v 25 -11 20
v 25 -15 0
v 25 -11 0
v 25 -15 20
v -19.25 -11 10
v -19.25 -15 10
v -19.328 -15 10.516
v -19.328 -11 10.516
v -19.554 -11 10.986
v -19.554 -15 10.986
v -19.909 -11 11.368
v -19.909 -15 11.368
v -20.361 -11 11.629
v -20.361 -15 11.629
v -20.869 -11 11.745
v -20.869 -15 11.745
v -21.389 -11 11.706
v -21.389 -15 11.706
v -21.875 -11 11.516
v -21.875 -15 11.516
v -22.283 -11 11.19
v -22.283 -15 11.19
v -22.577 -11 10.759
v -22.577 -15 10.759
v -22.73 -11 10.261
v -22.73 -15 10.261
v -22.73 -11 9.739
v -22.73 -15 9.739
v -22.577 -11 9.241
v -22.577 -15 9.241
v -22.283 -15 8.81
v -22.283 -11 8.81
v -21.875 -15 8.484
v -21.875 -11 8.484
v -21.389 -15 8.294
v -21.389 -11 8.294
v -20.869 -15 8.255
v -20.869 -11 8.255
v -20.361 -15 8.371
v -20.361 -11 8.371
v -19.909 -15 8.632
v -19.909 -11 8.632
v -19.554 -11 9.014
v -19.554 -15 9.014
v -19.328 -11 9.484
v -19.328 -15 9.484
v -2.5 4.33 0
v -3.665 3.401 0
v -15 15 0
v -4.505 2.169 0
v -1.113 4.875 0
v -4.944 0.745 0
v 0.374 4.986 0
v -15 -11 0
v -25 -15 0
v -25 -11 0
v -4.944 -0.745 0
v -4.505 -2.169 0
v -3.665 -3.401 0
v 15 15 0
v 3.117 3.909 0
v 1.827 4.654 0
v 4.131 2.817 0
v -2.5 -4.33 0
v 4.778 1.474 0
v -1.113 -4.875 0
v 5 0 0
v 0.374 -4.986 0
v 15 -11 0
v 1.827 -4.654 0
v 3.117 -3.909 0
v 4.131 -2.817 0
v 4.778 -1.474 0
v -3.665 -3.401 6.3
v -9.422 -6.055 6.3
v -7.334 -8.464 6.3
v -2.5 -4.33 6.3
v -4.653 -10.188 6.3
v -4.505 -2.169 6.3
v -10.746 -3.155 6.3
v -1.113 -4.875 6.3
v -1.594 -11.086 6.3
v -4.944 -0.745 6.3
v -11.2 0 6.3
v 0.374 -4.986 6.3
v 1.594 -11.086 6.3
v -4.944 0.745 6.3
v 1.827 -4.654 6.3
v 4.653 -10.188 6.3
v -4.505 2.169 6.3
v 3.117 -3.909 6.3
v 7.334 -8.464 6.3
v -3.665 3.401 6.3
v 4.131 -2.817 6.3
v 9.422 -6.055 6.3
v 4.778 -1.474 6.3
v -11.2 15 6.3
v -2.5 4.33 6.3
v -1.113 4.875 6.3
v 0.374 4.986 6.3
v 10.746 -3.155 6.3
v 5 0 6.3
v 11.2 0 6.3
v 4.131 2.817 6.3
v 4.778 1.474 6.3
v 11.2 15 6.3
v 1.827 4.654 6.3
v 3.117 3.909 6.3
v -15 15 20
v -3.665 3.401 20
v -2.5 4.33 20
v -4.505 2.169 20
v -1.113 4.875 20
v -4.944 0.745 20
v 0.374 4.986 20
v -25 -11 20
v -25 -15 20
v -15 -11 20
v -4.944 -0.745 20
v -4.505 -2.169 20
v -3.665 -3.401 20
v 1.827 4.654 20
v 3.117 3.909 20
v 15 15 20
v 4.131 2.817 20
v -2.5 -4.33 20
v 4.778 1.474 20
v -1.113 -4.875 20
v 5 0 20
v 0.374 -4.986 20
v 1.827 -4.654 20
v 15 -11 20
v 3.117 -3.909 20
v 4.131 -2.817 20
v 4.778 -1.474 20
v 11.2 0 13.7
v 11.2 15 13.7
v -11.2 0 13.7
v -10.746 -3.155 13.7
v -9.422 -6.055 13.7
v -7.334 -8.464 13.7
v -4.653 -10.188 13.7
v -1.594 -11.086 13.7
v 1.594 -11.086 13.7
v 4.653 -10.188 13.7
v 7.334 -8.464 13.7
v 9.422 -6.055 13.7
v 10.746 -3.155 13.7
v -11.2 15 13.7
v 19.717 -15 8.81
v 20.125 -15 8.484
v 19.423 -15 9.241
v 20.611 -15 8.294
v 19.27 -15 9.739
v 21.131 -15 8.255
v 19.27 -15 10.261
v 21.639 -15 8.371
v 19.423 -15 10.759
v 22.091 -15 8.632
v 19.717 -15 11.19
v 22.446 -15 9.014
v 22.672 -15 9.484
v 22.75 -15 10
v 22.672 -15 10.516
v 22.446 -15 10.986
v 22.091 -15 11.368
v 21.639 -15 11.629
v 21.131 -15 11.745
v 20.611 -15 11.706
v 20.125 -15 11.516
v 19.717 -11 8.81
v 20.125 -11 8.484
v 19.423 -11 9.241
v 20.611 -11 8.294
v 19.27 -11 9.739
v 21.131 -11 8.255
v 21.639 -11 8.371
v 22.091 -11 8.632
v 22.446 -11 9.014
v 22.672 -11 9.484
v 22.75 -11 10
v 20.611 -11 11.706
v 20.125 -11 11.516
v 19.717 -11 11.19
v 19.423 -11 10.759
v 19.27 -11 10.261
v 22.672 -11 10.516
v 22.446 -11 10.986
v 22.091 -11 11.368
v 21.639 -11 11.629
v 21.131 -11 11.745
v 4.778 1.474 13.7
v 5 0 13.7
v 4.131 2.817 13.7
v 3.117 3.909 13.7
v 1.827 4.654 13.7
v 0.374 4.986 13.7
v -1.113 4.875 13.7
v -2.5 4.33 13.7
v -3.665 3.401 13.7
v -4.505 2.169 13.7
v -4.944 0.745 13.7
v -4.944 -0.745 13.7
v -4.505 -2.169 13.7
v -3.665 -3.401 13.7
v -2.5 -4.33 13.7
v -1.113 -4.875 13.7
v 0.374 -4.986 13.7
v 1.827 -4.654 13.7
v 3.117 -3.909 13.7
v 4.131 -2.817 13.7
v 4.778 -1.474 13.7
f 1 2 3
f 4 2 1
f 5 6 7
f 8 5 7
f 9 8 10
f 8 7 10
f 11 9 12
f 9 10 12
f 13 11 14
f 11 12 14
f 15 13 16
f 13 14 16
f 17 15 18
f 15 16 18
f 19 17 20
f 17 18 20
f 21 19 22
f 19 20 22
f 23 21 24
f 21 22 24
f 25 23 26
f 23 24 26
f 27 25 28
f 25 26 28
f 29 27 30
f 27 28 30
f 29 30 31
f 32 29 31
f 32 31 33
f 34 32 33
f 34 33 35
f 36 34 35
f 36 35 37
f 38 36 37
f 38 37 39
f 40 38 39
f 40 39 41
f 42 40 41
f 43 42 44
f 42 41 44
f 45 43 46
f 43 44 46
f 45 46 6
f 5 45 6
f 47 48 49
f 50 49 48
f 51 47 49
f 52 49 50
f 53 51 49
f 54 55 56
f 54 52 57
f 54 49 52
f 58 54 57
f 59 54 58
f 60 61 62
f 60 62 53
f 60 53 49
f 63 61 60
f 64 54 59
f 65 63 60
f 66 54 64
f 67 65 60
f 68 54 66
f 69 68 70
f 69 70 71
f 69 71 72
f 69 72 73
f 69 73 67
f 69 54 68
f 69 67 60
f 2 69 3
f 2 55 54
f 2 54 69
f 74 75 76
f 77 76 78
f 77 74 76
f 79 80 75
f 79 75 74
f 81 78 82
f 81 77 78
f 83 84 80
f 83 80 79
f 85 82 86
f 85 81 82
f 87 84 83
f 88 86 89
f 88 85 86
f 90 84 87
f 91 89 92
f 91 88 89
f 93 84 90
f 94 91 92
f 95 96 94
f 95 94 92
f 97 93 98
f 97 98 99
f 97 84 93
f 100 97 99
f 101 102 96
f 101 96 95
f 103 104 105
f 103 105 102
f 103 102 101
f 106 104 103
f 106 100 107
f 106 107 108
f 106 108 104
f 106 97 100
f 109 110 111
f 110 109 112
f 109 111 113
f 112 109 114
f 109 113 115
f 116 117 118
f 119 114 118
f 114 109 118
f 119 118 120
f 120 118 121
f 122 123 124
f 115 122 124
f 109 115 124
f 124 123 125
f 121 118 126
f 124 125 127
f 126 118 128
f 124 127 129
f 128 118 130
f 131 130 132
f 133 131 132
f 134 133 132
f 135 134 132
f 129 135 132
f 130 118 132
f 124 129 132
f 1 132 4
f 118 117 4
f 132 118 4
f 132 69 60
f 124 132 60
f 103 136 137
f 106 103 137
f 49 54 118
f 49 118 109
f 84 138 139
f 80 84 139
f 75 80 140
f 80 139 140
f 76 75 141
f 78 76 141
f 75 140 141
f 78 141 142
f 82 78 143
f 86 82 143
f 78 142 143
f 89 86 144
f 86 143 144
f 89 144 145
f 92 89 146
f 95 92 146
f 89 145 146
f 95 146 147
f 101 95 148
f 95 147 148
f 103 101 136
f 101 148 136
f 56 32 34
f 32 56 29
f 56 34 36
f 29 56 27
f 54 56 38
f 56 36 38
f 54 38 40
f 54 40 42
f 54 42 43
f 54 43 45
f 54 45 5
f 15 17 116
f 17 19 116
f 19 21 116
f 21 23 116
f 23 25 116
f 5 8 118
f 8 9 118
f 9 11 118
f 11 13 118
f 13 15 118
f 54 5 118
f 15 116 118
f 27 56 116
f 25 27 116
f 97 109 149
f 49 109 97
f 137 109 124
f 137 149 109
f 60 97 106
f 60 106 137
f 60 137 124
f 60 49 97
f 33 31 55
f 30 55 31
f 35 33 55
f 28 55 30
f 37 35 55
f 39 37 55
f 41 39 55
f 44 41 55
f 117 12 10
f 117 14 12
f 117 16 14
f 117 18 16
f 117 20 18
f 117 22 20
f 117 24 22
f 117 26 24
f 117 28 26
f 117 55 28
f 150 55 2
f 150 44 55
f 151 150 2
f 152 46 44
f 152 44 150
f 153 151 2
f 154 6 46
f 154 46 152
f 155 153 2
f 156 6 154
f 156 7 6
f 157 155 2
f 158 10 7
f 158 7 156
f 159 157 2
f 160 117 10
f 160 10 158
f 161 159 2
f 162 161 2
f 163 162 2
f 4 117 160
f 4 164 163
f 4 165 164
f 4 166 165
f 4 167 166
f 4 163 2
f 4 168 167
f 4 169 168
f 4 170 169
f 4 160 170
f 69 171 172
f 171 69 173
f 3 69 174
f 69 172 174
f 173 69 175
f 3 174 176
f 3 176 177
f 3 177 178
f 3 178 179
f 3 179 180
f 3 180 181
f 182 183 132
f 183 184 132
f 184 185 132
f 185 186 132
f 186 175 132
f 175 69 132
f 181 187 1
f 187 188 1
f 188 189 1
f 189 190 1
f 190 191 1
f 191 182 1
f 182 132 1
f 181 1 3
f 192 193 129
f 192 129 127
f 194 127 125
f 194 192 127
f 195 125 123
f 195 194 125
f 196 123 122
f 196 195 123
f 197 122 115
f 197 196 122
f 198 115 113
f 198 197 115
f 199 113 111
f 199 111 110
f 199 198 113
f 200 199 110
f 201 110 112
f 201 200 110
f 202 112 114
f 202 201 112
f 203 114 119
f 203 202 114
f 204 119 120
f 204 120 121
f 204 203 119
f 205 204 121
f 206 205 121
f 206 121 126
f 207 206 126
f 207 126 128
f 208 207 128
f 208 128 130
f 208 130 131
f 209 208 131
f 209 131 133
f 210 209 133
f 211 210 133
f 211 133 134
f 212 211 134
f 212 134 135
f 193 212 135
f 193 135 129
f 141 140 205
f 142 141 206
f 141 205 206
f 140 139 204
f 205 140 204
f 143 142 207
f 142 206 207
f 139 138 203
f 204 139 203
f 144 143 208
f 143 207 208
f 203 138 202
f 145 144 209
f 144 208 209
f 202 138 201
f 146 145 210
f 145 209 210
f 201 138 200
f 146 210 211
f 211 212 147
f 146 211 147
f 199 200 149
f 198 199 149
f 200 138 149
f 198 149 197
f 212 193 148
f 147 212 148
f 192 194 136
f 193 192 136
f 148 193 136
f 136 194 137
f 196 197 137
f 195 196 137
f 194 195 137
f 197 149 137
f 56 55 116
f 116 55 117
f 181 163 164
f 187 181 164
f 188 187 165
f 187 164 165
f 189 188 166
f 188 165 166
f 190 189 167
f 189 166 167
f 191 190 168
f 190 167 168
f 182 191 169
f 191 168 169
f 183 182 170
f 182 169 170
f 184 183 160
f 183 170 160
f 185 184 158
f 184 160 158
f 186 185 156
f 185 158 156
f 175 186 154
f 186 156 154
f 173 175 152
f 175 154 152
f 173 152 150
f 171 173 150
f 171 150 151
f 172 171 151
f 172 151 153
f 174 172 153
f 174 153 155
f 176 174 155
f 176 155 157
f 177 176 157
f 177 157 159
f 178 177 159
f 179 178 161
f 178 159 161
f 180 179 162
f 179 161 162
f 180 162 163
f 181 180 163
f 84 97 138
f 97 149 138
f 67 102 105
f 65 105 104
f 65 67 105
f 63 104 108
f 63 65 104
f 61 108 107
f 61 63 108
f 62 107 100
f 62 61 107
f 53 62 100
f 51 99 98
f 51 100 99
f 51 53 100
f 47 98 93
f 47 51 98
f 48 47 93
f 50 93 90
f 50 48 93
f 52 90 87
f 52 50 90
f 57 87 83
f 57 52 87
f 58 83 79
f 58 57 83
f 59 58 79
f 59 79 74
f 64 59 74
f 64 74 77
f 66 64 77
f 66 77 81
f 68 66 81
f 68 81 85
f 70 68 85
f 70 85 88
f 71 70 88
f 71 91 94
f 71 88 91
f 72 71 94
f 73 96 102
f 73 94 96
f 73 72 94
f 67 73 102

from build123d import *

# Parameters (mm, degrees)
SKETCH2_W           = 30
SKETCH2_H           = 30
SKETCH2_R           = 5
BOSS_EXTRUDE1_DEPTH = 20
CUT_EXTRUDE2_START  = 10
CUT_EXTRUDE2_DEPTH  = 3.7
SKETCH4_W           = 10
SKETCH4_H           = 20
SKETCH4_R           = 1.75
BOSS_EXTRUDE2_DEPTH = 4


with BuildPart() as part:
    # Sketch2 → Boss-Extrude1 (new body)
    with BuildSketch(Plane.XY):
        Rectangle(SKETCH2_W, SKETCH2_H)
        Circle(SKETCH2_R, mode=Mode.SUBTRACT)
    extrude(amount=BOSS_EXTRUDE1_DEPTH)

    # Sketch3 → Cut-Extrude2 (cut, symmetric)
    with BuildSketch(Plane.XY.offset(CUT_EXTRUDE2_START)):
        with BuildLine():
            Line((-11.2, 15), (-11.2, 0))
            ThreePointArc((-11.2, 0), (0, -11.2), (11.2, 0))
            Line((11.2, 0), (11.2, 15))
            Line((11.2, 15), (-11.2, 15))
        make_face()
    extrude(amount=CUT_EXTRUDE2_DEPTH, both=True, mode=Mode.SUBTRACT)

    # Sketch4 → Boss-Extrude2 (add)
    with BuildSketch(Plane.XZ.offset(15)):
        with Locations((-20, 10)):
            Rectangle(SKETCH4_W, SKETCH4_H)
        with Locations((-21, 10)):
            Circle(SKETCH4_R, mode=Mode.SUBTRACT)
        with Locations((20, 10)):
            Rectangle(SKETCH4_W, SKETCH4_H)
        with Locations((21, 10)):
            Circle(SKETCH4_R, mode=Mode.SUBTRACT)
    extrude(amount=-BOSS_EXTRUDE2_DEPTH)


solid = part.part
